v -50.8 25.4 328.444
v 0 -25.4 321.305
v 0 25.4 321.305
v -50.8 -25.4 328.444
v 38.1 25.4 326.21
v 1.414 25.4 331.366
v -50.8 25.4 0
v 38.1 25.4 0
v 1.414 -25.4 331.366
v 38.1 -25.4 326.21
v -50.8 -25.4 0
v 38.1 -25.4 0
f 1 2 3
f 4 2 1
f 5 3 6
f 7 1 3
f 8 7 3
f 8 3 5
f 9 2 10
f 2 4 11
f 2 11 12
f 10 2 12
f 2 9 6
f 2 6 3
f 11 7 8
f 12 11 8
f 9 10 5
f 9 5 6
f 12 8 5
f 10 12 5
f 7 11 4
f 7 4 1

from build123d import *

# Parameters (mm, degrees)
SKETCH1_W               = 101.6
SKETCH1_H               = 50.8
BOSS_EXTRUDE1_DEPTH     = 331.365720046
CUT_EXTRUDE1_DEPTH      = 340.064183336
CUT_EXTRUDE1_DEPTH_BACK = 340.064183336
CUT_EXTRUDE2_DEPTH      = 340.064183336
CUT_EXTRUDE2_DEPTH_BACK = 340.064183336
SKETCH3_W               = 12.7
SKETCH3_H               = 355.6


with BuildPart() as part:
    # Sketch1 → Boss-Extrude1 (new body)
    with BuildSketch(Plane.XY):
        Rectangle(SKETCH1_W, SKETCH1_H)
    extrude(amount=BOSS_EXTRUDE1_DEPTH)

    # Sketch2 → Cut-Extrude1 (cut, two sides: drawn at the far end of the back side and taken through both)
    with BuildSketch(Plane(origin=(0, 25.4, 0), x_dir=(1, 0, 0), z_dir=(0, 1, 0)).offset(-CUT_EXTRUDE1_DEPTH_BACK)):
        Polygon((50.8, -324.424970201), (1.413998706, -331.365720046), (50.8, -331.365720046), align=None)
        Polygon((0, -321.304596468), (-50.8, -328.44407087), (-50.8, -331.365720046), (1.413998706, -331.365720046), align=None)
    extrude(amount=CUT_EXTRUDE1_DEPTH + CUT_EXTRUDE1_DEPTH_BACK, mode=Mode.SUBTRACT)

    # Sketch3 → Cut-Extrude2 (cut, two sides: drawn at the far end of the back side and taken through both)
    with BuildSketch(Plane.XZ.offset(25.4).offset(-CUT_EXTRUDE2_DEPTH_BACK)):
        with Locations((44.45, 177.8)):
            Rectangle(SKETCH3_W, SKETCH3_H)
    extrude(amount=CUT_EXTRUDE2_DEPTH + CUT_EXTRUDE2_DEPTH_BACK, mode=Mode.SUBTRACT)


solid = part.part
